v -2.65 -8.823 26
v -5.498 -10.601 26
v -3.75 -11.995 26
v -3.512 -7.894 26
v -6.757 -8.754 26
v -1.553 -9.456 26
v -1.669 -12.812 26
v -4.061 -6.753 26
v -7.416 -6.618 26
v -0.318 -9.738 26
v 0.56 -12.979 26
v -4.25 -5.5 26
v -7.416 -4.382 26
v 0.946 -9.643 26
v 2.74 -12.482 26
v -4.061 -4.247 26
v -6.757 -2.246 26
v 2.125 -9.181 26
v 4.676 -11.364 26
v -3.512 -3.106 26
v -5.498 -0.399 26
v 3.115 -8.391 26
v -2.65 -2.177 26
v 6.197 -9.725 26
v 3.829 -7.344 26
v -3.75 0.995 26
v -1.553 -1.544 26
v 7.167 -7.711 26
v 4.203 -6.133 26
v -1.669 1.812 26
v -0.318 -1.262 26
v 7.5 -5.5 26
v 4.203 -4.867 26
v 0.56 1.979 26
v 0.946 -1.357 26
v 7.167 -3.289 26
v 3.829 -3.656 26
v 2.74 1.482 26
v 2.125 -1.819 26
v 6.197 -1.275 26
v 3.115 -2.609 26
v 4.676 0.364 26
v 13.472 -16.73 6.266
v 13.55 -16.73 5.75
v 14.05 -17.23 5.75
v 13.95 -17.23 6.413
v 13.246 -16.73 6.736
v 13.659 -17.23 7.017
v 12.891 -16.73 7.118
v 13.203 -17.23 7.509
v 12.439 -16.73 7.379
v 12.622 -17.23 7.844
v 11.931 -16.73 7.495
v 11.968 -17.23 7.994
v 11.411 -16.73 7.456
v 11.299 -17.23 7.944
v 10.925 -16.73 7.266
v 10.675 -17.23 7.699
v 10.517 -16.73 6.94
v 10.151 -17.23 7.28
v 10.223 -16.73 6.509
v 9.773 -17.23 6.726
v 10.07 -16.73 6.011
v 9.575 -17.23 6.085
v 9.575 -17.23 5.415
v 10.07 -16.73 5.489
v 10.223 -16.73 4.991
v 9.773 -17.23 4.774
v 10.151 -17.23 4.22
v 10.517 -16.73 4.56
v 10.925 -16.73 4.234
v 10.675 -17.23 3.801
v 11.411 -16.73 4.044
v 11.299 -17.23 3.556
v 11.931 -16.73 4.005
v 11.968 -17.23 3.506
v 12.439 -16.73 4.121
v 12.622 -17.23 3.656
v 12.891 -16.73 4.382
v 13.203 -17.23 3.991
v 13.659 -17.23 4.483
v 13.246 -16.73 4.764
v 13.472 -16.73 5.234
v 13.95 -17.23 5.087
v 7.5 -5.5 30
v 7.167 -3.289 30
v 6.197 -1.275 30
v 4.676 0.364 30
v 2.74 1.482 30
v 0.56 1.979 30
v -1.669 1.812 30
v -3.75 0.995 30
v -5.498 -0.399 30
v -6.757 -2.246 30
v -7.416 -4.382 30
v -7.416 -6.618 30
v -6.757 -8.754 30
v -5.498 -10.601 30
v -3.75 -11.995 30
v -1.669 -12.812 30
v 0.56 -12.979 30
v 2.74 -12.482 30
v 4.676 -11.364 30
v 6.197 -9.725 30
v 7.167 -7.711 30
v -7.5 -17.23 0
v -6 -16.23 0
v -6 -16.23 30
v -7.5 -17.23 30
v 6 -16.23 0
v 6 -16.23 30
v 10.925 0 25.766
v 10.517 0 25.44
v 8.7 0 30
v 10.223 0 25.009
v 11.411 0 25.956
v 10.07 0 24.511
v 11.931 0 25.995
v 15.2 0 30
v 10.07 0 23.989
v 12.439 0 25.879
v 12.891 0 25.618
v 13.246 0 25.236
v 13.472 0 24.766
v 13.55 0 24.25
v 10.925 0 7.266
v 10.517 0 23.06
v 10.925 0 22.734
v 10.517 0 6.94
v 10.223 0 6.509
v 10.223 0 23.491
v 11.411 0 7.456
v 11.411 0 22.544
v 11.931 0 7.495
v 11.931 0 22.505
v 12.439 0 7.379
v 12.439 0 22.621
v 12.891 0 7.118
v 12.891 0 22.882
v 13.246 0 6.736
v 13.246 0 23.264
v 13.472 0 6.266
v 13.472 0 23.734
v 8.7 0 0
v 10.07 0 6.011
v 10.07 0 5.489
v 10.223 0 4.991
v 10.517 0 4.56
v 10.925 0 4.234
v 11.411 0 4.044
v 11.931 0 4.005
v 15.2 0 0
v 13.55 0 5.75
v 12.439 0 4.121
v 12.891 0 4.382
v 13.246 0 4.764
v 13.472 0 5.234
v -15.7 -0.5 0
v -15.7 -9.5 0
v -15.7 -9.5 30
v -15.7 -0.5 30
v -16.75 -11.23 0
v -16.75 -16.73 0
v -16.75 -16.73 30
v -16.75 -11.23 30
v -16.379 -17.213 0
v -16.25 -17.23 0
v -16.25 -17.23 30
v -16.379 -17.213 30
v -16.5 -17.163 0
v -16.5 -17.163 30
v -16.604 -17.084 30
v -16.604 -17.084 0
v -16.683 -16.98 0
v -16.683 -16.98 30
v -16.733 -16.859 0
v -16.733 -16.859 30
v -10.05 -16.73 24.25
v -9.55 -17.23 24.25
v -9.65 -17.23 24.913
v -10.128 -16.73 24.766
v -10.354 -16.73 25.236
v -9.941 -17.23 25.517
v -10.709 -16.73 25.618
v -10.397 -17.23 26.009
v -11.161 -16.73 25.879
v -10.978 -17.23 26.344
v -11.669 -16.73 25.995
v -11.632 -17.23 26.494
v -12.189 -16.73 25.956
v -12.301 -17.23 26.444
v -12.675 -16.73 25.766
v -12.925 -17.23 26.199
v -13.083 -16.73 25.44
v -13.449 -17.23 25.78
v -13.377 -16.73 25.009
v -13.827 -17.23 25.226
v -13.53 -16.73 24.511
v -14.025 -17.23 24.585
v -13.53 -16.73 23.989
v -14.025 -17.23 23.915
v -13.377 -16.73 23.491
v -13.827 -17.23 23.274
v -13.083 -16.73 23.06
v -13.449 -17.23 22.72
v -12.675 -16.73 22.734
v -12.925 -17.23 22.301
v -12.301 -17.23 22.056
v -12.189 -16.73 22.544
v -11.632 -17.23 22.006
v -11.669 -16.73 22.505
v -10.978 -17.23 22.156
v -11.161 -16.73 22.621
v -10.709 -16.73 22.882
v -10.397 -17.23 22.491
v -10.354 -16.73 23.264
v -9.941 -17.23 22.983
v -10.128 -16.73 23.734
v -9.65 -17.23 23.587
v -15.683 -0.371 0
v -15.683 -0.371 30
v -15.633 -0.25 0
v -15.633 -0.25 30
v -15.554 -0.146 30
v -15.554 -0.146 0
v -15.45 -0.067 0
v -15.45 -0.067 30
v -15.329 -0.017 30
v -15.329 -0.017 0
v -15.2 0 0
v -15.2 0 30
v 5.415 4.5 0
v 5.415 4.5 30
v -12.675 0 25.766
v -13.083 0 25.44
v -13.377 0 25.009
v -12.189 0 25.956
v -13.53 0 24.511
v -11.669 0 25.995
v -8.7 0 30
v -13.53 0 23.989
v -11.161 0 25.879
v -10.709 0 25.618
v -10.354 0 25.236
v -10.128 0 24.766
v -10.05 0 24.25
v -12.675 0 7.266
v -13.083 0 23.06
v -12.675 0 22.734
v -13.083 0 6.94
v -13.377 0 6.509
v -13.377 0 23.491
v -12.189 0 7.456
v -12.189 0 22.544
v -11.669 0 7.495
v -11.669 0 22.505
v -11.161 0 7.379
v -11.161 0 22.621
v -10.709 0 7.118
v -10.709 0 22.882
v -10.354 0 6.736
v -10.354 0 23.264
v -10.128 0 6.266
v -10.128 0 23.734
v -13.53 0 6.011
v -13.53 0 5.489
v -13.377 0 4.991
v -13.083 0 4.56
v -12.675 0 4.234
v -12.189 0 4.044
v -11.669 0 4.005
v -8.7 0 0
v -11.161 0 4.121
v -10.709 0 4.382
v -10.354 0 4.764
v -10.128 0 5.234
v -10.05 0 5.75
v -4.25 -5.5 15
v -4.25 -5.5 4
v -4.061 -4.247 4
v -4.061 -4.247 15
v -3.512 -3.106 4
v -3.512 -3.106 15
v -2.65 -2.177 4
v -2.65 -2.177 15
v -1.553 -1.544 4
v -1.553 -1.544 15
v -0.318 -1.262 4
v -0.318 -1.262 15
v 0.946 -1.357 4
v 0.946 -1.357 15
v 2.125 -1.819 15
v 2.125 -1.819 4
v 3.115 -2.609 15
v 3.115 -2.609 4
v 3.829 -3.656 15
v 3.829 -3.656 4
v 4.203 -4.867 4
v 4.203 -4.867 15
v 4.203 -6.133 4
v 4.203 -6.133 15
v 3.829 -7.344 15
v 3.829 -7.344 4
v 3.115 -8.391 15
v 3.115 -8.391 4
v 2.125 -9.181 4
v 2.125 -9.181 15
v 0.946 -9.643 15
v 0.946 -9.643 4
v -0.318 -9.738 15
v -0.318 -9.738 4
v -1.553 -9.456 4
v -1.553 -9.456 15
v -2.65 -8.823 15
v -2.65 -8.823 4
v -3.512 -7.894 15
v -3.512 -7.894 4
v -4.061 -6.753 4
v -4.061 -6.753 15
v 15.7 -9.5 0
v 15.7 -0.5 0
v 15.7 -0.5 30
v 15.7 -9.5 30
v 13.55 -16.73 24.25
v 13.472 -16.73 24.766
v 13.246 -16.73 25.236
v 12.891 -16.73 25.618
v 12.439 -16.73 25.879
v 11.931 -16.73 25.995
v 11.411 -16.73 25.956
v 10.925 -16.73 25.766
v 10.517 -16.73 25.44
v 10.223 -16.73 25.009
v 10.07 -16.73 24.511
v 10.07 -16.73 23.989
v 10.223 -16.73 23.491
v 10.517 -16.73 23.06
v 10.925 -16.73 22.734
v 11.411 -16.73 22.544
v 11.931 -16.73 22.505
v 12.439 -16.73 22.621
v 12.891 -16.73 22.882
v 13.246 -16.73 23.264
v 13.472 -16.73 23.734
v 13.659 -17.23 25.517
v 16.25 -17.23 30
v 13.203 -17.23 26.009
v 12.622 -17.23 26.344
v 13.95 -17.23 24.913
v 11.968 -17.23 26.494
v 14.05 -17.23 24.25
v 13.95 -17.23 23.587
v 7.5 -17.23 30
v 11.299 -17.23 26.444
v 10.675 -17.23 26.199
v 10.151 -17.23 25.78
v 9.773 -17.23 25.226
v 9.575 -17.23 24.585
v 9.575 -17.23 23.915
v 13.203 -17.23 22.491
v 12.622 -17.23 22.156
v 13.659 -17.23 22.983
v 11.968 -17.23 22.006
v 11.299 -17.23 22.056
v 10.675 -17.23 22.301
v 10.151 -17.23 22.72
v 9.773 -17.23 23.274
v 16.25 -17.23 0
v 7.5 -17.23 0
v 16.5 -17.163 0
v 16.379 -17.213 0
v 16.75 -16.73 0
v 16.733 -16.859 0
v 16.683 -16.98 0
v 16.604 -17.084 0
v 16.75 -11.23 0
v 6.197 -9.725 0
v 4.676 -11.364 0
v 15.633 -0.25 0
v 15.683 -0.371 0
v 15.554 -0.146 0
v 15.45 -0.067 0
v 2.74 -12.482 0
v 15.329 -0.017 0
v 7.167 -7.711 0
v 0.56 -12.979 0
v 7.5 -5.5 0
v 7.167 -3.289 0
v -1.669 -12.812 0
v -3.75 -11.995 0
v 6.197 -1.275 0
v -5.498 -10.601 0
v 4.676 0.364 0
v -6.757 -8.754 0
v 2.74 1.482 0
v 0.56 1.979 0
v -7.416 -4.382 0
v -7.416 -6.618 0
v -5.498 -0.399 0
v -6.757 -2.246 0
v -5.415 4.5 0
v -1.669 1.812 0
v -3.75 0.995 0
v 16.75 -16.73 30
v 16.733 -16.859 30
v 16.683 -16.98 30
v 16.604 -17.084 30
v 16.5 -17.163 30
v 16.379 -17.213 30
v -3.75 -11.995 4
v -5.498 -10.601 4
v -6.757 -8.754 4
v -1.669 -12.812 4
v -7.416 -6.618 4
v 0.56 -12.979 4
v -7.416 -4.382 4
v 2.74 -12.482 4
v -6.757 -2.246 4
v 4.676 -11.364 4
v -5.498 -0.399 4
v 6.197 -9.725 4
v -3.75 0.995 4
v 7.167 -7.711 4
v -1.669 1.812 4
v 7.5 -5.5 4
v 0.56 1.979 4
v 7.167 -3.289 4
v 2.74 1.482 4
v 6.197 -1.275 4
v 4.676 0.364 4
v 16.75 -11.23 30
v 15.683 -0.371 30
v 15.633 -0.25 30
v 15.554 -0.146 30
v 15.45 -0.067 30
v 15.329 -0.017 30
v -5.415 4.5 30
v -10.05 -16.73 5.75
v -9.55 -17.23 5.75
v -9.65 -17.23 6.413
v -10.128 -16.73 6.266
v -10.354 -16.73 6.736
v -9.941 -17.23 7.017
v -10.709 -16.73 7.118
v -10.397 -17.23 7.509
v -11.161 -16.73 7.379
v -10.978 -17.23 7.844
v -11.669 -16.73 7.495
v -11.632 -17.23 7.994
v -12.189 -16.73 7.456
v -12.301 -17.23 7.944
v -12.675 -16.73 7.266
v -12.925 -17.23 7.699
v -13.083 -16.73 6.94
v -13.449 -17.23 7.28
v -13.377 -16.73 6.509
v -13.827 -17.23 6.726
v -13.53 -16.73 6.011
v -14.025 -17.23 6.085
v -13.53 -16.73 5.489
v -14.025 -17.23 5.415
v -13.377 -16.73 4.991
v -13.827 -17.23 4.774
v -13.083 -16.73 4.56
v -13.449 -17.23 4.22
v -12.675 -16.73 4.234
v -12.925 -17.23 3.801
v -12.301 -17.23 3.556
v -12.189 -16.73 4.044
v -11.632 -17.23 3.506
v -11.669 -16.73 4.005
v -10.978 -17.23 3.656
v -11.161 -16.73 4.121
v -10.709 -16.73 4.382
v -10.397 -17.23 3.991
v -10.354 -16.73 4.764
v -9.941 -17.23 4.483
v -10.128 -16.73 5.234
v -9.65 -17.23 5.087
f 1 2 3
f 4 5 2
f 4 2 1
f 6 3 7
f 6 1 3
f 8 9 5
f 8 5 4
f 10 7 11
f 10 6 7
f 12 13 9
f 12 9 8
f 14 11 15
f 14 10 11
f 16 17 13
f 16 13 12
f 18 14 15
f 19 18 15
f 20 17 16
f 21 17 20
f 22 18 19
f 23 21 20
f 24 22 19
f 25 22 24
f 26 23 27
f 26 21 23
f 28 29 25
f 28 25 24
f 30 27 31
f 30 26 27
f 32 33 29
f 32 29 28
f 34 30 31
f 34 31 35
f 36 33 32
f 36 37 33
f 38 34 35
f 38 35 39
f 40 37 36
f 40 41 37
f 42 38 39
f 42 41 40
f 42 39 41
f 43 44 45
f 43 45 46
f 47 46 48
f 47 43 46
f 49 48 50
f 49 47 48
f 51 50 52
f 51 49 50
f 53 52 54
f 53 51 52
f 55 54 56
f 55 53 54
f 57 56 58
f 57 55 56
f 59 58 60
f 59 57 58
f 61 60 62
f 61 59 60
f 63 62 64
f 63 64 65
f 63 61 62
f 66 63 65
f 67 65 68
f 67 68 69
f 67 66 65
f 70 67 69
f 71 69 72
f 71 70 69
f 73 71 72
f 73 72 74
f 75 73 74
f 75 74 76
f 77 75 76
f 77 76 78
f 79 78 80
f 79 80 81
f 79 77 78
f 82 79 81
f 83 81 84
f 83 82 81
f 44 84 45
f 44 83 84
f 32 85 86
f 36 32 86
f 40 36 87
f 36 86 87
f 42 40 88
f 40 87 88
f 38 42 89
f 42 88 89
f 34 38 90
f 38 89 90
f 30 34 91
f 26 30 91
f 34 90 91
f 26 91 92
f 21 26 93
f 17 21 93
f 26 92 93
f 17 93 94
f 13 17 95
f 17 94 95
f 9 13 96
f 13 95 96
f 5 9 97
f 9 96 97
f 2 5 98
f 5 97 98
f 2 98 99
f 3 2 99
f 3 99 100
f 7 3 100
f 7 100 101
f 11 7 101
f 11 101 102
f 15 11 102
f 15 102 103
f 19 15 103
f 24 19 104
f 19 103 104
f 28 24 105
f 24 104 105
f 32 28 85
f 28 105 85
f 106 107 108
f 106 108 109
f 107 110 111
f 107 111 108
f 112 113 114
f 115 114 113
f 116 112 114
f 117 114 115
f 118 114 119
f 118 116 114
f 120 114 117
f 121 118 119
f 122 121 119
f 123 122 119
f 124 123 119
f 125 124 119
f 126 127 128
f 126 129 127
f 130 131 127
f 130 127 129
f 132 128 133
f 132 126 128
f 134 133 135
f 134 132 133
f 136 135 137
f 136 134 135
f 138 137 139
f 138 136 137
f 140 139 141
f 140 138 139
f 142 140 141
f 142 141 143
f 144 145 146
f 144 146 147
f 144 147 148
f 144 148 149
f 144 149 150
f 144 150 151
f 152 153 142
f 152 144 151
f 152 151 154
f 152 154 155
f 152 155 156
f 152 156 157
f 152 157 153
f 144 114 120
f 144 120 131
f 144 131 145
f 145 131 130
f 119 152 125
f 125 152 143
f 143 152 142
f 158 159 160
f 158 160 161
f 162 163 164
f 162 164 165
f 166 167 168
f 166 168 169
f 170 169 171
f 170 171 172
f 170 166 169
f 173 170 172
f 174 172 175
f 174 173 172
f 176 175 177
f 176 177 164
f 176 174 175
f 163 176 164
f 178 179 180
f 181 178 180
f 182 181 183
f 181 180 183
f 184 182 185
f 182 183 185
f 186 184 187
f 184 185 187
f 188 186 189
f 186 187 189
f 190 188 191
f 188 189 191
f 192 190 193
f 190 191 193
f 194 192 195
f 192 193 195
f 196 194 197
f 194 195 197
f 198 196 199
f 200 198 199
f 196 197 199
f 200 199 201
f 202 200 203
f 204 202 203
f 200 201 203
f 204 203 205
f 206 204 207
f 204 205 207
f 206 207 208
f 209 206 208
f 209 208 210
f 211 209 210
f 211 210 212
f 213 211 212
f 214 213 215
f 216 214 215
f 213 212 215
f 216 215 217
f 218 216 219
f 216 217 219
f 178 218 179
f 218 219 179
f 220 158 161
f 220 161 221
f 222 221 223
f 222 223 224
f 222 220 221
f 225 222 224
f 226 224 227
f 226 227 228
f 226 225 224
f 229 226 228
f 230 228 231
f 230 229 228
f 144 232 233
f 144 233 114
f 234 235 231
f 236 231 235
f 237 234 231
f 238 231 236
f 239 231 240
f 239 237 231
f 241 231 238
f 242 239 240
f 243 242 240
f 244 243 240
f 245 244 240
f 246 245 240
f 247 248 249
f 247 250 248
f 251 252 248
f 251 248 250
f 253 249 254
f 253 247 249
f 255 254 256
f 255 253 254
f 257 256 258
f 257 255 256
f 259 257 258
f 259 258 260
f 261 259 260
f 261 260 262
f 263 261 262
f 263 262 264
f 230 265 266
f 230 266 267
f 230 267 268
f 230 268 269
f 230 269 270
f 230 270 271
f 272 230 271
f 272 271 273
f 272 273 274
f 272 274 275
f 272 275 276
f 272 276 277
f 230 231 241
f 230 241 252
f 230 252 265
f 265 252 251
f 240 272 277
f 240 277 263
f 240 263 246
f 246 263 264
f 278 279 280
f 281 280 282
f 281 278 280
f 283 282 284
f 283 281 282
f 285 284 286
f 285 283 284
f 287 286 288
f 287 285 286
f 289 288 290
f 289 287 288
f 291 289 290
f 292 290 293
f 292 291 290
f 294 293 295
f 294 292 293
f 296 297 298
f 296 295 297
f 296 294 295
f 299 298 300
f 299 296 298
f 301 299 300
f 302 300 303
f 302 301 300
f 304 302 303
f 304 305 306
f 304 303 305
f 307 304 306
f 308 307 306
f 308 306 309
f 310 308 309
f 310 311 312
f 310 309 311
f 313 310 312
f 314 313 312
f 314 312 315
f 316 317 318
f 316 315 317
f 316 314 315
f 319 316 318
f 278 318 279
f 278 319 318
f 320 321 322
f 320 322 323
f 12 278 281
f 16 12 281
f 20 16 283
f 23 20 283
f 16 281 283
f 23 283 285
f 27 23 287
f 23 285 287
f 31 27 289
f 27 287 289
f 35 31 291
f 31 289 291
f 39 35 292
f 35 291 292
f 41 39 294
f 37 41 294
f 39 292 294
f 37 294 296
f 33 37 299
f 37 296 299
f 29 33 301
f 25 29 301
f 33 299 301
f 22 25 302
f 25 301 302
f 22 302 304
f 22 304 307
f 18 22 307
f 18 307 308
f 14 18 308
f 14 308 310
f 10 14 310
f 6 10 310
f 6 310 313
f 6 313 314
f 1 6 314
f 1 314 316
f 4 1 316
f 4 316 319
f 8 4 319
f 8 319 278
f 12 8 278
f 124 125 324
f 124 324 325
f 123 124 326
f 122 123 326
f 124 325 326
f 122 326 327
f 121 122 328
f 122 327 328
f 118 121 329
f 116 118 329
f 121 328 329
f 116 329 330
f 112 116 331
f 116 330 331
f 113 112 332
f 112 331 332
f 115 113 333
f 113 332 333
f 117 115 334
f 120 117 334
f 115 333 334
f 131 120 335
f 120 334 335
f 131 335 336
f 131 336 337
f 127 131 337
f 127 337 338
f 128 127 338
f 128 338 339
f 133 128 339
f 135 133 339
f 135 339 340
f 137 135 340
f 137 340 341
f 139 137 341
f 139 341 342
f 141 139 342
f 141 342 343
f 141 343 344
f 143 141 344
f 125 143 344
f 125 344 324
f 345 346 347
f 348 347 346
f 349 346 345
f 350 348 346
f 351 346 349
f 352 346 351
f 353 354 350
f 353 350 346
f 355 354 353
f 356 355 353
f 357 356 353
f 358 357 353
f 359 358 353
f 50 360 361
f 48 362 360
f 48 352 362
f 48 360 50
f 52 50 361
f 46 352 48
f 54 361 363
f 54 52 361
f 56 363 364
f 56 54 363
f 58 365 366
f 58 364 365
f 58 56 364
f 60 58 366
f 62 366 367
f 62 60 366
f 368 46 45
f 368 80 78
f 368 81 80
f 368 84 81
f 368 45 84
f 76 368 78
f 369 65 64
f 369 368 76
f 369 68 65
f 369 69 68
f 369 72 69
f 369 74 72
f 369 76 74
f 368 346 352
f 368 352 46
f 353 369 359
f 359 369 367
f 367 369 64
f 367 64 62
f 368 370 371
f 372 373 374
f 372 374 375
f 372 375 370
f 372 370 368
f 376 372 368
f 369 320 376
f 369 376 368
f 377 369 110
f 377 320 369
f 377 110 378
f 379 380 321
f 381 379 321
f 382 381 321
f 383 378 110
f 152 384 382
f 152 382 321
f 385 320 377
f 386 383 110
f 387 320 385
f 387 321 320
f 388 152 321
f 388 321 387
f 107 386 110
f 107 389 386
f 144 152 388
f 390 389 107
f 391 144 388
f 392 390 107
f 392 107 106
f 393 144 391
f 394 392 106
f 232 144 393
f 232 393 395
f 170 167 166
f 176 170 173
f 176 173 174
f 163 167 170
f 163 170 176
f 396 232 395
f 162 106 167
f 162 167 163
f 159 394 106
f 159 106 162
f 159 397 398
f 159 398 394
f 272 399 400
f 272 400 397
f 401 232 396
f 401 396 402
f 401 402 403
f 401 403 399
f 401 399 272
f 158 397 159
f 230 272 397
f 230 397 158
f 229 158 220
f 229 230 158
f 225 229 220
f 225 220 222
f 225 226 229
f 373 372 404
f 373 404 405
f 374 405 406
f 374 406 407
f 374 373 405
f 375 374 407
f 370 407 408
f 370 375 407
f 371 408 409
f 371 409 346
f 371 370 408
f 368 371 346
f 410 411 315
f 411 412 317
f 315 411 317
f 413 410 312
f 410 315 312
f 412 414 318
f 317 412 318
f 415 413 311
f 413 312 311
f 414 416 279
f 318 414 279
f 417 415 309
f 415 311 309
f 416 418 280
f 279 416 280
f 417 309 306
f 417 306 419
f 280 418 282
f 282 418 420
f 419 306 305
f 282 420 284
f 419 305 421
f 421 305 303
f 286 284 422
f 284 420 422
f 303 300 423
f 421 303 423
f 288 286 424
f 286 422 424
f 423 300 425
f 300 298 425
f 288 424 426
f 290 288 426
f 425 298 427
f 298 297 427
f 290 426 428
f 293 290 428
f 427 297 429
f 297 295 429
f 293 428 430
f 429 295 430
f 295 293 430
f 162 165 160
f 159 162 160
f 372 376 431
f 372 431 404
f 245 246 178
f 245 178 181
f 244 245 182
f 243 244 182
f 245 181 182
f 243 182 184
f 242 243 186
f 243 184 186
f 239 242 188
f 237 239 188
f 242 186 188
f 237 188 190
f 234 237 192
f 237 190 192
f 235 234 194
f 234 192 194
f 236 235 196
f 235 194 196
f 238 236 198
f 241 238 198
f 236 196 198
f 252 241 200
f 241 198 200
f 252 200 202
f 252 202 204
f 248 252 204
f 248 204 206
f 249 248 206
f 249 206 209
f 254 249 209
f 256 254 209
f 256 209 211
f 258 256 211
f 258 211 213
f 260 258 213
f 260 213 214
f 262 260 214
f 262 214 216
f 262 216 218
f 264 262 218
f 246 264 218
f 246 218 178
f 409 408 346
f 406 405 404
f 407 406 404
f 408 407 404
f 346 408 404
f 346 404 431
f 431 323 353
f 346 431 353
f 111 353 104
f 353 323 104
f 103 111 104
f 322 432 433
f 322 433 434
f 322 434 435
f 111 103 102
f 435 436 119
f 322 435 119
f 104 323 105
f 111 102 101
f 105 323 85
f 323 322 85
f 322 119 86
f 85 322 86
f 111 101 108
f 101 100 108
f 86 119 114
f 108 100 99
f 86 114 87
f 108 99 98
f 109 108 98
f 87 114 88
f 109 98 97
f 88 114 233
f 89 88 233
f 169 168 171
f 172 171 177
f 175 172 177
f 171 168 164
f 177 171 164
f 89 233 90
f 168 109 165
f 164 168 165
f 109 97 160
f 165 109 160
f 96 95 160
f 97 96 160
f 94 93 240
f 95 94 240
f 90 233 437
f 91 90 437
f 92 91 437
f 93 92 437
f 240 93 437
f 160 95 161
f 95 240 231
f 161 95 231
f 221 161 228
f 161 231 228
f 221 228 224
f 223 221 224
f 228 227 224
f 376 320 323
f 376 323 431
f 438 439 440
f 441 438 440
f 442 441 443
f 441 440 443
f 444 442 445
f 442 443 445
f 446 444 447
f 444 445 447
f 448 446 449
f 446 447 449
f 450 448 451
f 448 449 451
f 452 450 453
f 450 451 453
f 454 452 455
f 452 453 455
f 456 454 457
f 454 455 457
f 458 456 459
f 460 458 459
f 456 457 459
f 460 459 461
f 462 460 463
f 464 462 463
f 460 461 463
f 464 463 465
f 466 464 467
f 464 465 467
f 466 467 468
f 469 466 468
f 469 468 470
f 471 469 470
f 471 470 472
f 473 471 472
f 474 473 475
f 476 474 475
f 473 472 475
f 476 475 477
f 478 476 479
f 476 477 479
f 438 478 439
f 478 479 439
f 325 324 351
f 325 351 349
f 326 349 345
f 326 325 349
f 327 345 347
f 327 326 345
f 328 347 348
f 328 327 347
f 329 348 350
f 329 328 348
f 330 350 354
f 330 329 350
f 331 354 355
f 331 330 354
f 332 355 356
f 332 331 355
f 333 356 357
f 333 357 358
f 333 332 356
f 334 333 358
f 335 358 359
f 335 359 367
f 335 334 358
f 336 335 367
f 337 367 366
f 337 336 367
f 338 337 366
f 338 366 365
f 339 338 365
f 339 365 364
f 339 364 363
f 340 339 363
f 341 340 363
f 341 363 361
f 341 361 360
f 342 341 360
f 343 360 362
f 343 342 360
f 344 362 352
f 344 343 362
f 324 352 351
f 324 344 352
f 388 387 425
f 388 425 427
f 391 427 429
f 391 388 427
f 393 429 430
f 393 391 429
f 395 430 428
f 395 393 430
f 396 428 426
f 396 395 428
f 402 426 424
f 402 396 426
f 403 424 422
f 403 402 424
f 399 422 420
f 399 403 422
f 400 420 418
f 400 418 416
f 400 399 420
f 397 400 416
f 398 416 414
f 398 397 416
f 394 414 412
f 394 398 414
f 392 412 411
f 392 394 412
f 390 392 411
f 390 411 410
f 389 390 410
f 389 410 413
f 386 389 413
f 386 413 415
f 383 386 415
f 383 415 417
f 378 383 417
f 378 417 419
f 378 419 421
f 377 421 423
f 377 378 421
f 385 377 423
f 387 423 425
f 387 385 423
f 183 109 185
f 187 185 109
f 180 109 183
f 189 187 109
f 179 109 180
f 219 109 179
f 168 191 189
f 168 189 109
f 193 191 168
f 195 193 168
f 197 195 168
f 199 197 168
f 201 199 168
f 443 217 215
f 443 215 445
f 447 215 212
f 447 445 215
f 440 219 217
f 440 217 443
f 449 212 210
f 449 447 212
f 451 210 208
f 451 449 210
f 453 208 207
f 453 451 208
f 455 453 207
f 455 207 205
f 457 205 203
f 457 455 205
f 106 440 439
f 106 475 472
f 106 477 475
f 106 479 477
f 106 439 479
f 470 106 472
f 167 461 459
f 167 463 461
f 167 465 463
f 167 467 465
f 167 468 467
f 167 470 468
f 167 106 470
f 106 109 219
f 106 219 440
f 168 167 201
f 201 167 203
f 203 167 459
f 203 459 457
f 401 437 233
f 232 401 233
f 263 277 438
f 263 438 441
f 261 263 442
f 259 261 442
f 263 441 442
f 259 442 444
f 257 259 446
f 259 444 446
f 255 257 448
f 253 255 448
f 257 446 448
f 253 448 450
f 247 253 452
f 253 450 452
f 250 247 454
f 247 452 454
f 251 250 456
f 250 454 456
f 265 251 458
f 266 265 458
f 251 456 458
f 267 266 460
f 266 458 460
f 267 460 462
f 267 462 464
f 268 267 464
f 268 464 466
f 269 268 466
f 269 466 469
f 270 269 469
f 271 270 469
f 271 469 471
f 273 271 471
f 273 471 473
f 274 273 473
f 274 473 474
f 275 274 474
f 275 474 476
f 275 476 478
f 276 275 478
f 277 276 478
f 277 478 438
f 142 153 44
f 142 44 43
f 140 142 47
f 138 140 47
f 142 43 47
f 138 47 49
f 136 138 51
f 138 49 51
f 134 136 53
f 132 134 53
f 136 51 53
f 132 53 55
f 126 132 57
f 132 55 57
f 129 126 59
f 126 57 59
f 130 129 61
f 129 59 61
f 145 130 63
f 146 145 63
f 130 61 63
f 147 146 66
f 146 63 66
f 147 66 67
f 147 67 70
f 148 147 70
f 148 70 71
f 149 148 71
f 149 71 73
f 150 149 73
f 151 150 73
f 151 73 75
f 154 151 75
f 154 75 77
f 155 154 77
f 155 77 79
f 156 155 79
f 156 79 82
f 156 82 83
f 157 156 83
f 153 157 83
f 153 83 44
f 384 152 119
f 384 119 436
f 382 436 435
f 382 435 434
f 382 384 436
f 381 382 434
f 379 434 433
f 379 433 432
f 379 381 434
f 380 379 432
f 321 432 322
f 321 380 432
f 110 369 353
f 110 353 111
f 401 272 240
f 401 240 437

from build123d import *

# Parameters (mm, degrees)
SALIENTE_EXTRUIR1_DEPTH    = 30
CROQUIS2_R                 = 7.5
CORTAR_EXTRUIR1_DEPTH      = 4
CROQUIS3_R                 = 4.25
CORTAR_EXTRUIR2_DEPTH      = 16
CORTAR_EXTRUIR2_DEPTH_BACK = 16
CROQUIS5_R                 = 1.75
CORTAR_EXTRUIR3_DEPTH      = 1
CORTAR_EXTRUIR3_DEPTH_BACK = 22.73
CHAFL_N1_SIZE              = 0.5


with BuildPart() as part:
    # Croquis1 → Saliente-Extruir1 (new body)
    with BuildSketch(Plane.XY):
        with BuildLine():
            Line((-15.2, 0), (-8.7, 0))
            Line((-8.7, 0), (-5.415, 4.5))
            Line((-5.415, 4.5), (5.415, 4.5))
            Line((5.415, 4.5), (8.7, 0))
            Line((8.7, 0), (15.2, 0))
            ThreePointArc((15.2, 0), (15.553553391, -0.146446609), (15.7, -0.5))
            Line((15.7, -0.5), (15.7, -9.5))
            Line((15.7, -9.5), (16.75, -11.23))
            Line((16.75, -11.23), (16.75, -16.73))
            ThreePointArc((16.75, -16.73), (16.603553391, -17.083553391), (16.25, -17.23))
            Line((16.25, -17.23), (7.5, -17.23))
            Line((7.5, -17.23), (6, -16.23))
            Line((6, -16.23), (-6, -16.23))
            Line((-6, -16.23), (-7.5, -17.23))
            Line((-7.5, -17.23), (-16.25, -17.23))
            ThreePointArc((-16.25, -17.23), (-16.603553391, -17.083553391), (-16.75, -16.73))
            Line((-16.75, -16.73), (-16.75, -11.23))
            Line((-16.75, -11.23), (-15.7, -9.5))
            Line((-15.7, -9.5), (-15.7, -0.5))
            ThreePointArc((-15.7, -0.5), (-15.553553391, -0.146446609), (-15.2, 0))
        make_face()
    extrude(amount=SALIENTE_EXTRUIR1_DEPTH)

    # Croquis2 → Cortar-Extruir1 (cut)
    with BuildSketch(Plane.XY):
        with Locations((0, -5.5)):
            Circle(CROQUIS2_R)
    cortar_extruir1 = extrude(amount=CORTAR_EXTRUIR1_DEPTH, mode=Mode.SUBTRACT)

    # Simetría1: Cortar-Extruir1 across plane
    add(cortar_extruir1.mirror(Plane(origin=(0, 0, 15), x_dir=(1, 0, 0), z_dir=(0, 0, -1))), mode=Mode.SUBTRACT)

    # Croquis3 → Cortar-Extruir2 (cut, two sides)
    with BuildSketch(Plane(origin=(0, 0, 15), x_dir=(-1, 0, 0), z_dir=(0, 0, -1))) as cortar_extruir2_sk:
        with Locations((0, -5.5)):
            Circle(CROQUIS3_R)
    extrude(amount=CORTAR_EXTRUIR2_DEPTH, mode=Mode.SUBTRACT)
    extrude(cortar_extruir2_sk.sketch, amount=-CORTAR_EXTRUIR2_DEPTH_BACK, mode=Mode.SUBTRACT)

    # Croquis5 → Cortar-Extruir3 (cut, two sides)
    with BuildSketch(Plane.XZ.offset(17.23)) as cortar_extruir3_sk:
        with Locations((-11.8, 24.25)):
            Circle(CROQUIS5_R)
        with Locations((11.8, 24.25)):
            Circle(CROQUIS5_R)
        with Locations((11.8, 5.75)):
            Circle(CROQUIS5_R)
        with Locations((-11.8, 5.75)):
            Circle(CROQUIS5_R)
    extrude(amount=CORTAR_EXTRUIR3_DEPTH, mode=Mode.SUBTRACT)
    extrude(cortar_extruir3_sk.sketch, amount=-CORTAR_EXTRUIR3_DEPTH_BACK, mode=Mode.SUBTRACT)

    # Chaflán1
    chafl_n1_edges = [part.edges().sort_by_distance(p)[0] for p in [
        (-13.55, -17.23, 5.75),
        (10.05, -17.23, 5.75),
        (10.05, -17.23, 24.25),
        (-13.55, -17.23, 24.25),
    ]]
    chamfer(chafl_n1_edges, length=CHAFL_N1_SIZE)


solid = part.part
